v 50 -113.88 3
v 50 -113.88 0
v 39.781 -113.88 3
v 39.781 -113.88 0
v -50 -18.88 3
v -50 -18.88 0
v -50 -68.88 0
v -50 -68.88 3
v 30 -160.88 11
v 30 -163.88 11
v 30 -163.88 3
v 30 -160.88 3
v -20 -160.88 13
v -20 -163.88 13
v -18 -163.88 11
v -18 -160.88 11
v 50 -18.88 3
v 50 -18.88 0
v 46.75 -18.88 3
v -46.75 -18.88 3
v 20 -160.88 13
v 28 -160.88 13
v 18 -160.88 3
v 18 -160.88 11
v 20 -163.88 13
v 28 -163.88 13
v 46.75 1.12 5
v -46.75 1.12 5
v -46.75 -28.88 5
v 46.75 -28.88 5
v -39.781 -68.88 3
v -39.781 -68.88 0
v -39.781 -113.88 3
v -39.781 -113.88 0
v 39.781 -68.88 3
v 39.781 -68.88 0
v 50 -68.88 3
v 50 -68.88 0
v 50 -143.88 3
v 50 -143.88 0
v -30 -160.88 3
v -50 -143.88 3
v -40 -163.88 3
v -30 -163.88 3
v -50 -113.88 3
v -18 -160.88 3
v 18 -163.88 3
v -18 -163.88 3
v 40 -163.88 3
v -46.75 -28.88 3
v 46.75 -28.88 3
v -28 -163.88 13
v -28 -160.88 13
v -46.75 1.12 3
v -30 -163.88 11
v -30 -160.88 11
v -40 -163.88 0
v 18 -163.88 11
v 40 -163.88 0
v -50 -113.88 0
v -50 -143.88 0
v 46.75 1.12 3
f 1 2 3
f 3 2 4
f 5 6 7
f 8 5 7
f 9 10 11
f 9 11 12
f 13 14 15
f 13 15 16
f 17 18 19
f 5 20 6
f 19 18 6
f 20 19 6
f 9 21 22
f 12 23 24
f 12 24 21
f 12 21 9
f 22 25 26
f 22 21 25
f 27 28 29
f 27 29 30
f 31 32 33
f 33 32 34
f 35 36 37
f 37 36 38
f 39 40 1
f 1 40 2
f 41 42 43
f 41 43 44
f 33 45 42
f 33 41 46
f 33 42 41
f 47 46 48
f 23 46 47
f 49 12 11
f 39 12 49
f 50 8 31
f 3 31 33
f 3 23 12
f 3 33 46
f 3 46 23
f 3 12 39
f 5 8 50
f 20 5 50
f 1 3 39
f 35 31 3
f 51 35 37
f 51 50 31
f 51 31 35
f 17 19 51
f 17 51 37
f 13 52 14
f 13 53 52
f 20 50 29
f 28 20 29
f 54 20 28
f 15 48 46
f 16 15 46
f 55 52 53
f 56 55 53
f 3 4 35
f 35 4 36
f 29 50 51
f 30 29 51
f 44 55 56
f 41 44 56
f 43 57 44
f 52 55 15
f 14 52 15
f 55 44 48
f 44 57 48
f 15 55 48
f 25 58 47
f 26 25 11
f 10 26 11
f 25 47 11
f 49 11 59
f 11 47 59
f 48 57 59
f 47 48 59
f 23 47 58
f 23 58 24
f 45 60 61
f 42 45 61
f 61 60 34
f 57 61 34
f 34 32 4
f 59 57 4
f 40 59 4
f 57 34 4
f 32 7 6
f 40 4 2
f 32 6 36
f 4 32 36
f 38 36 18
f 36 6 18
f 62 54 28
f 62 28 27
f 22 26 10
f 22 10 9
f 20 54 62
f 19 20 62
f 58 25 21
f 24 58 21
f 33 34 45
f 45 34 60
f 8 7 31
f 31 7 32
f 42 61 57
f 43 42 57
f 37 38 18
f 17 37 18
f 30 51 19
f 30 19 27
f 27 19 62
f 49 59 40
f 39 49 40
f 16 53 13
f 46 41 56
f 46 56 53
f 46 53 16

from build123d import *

# Parameters (mm, degrees)
F1_DEPTH = 3
F2_W     = 12
F2_H     = 3
F3_DEPTH = 10
F4_SIZE  = 2
F5_W     = 93.5
F5_H     = 30
F6_DEPTH = 2


# Not quite as in the source:
# - a feature names something its author has since deleted; it is built from what else it names


with BuildPart() as f1:
    # F0 (on Top) → F1 (new body)
    with BuildSketch(Plane.XY):
        Polygon((50, -18.8796229661), (-50, -18.8796229661), (-50, -68.8796229661), (-39.780523628, -68.8796229661), (-39.780523628, -113.8796229661), (-50, -113.8796229661), (-50, -143.8796229661), (-40, -163.8796229661), (40, -163.8796229661), (50, -143.8796229661), (50, -113.8796229661), (39.780523628, -113.8796229661), (39.780523628, -68.8796229661), (50, -68.8796229661), align=None)
    extrude(amount=F1_DEPTH)

    # F2 (on face) → F3 (join)
    with BuildSketch(Plane.XY.offset(3)):
        with Locations((-24, -162.3796229661)):
            Rectangle(F2_W, F2_H)
        with Locations((24, -162.3796229661)):
            Rectangle(F2_W, F2_H)
    extrude(amount=F3_DEPTH)

    # F4
    f4_edges = [f1.edges().sort_by_distance(p)[0] for p in [
        (-18, -162.379623, 13),
        (-30, -162.379623, 13),
        (30, -162.379623, 13),
        (18, -162.379623, 13),
    ]]
    chamfer(f4_edges, length=F4_SIZE)

    # F5 (on face) → F6 (join)
    with BuildSketch(Plane.XY.offset(3)):
        with Locations((0, -13.8796229661)):
            Rectangle(F5_W, F5_H)
    extrude(amount=F6_DEPTH)


solid = f1.part
